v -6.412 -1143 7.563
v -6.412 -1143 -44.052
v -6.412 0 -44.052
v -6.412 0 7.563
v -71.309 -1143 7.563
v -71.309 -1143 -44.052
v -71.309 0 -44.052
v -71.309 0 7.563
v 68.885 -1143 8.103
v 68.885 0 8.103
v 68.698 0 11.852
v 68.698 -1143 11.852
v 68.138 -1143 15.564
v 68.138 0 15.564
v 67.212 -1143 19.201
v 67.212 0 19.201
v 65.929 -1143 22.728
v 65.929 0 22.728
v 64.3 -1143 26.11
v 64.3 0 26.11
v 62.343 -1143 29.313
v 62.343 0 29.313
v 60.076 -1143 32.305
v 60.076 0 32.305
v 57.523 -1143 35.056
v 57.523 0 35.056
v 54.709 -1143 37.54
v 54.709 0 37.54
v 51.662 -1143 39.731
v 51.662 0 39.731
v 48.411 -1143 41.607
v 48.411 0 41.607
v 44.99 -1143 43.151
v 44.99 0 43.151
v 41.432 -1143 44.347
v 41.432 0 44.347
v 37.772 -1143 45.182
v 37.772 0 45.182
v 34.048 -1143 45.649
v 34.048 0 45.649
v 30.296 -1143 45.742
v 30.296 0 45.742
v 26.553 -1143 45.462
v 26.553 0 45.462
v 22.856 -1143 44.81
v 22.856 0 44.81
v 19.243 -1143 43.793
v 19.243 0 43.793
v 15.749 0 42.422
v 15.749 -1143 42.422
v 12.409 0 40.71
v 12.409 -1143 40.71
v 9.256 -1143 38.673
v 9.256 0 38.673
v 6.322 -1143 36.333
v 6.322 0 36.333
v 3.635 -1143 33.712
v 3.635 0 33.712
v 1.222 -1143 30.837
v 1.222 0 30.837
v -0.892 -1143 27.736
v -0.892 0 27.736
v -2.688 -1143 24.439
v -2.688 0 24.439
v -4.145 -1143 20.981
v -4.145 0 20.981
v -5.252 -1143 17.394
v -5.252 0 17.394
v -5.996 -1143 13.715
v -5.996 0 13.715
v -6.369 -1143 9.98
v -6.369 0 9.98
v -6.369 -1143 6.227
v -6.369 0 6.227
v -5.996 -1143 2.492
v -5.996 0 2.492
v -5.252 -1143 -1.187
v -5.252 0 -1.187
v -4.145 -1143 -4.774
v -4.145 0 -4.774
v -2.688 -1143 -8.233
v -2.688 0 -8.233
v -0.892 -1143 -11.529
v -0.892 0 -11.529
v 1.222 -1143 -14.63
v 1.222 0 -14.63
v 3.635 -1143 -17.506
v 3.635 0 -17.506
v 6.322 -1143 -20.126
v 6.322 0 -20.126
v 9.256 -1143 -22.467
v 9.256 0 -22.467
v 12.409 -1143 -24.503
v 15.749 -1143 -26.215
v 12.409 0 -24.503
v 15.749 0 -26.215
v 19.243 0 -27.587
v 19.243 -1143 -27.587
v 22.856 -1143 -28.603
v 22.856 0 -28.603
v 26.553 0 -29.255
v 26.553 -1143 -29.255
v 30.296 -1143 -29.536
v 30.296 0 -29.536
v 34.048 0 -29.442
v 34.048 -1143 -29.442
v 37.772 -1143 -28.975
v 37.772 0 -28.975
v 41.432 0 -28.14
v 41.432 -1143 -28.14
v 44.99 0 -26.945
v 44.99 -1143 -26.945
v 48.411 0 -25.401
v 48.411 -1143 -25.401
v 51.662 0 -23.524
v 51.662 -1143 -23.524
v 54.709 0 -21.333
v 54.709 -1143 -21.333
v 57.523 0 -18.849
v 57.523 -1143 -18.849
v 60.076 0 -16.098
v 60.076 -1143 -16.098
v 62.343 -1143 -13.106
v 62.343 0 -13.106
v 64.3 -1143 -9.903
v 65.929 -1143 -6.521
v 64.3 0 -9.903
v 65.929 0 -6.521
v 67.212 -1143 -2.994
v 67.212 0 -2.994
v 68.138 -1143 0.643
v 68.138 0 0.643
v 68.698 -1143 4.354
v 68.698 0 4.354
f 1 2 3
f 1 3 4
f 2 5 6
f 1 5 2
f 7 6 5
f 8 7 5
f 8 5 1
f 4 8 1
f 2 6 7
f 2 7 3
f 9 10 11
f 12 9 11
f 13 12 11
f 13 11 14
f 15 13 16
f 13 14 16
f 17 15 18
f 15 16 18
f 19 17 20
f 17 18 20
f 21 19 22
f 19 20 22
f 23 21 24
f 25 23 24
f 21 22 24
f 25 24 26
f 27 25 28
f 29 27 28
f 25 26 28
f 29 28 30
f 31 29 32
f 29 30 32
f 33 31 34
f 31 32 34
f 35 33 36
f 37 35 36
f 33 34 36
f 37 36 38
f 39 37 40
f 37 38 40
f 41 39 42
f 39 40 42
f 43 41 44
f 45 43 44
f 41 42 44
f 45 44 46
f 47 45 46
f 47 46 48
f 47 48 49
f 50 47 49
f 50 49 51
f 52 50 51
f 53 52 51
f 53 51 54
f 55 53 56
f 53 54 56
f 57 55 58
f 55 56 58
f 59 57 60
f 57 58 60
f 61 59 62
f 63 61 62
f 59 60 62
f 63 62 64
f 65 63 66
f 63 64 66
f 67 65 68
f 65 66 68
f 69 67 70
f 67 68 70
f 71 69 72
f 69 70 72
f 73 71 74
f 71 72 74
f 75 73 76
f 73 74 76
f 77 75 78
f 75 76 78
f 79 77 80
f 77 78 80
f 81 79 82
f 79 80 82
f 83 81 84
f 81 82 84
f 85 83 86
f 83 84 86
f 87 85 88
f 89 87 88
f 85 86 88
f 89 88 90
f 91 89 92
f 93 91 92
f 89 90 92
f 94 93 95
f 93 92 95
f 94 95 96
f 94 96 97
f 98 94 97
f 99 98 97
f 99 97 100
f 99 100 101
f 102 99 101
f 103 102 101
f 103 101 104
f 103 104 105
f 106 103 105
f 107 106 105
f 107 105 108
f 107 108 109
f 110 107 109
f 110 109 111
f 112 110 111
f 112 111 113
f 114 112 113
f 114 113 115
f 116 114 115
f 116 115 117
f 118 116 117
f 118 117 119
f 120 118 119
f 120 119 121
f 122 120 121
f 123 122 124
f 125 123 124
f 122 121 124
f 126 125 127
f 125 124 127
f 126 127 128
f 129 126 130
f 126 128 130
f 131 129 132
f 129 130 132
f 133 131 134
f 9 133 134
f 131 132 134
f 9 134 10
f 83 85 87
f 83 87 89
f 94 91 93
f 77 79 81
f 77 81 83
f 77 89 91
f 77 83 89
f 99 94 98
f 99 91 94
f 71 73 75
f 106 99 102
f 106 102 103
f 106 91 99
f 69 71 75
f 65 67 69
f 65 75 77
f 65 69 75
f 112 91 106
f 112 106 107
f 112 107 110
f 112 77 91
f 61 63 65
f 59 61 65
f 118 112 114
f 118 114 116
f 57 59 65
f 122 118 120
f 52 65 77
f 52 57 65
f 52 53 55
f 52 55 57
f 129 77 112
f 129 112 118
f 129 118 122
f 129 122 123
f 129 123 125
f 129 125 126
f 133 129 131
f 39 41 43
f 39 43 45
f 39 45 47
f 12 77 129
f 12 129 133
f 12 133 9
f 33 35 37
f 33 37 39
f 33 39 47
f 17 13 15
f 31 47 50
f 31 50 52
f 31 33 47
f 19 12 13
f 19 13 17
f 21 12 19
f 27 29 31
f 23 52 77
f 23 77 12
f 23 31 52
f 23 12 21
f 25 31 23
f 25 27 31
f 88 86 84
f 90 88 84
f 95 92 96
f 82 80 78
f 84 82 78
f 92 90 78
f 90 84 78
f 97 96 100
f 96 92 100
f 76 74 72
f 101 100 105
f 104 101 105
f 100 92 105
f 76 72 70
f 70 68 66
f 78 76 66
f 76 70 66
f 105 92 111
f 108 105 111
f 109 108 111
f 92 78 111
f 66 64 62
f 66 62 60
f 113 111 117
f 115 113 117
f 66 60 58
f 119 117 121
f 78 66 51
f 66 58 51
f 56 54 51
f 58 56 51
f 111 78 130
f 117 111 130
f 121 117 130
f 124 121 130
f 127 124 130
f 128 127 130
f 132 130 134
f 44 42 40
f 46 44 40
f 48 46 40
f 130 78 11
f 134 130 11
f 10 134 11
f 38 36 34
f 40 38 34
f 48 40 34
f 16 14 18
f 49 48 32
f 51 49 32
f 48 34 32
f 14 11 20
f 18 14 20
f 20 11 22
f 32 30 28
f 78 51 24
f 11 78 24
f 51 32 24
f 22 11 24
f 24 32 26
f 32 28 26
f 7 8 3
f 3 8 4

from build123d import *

# Parameters (mm, degrees)
F1_DEPTH = 1143
F0_W     = 64.8966471037
F0_H     = 51.6150052091


with BuildPart() as f1:
    # F0 (on Front) → F1 (new body)
    with BuildSketch(Plane.XZ):
        with BuildLine():
            ThreePointArc((-6.4121966878, 7.5626427671), (31.5047843029, -29.546284868), (68.8849946834, 8.1032812595))
            ThreePointArc((68.8849946834, 8.1032812595), (30.9641318748, 45.7528473871), (-6.4121966878, 7.5626427671))
        make_face()
    extrude(amount=F1_DEPTH)


with BuildPart() as f1b:
    # F0 (on Front) → F1, piece 2 (new body)
    with BuildSketch(Plane.XZ):
        with Locations((-38.8605202396, -18.2448598374)):
            Rectangle(F0_W, F0_H)
    extrude(amount=F1_DEPTH)


solid = Compound([f1.part, f1b.part])
